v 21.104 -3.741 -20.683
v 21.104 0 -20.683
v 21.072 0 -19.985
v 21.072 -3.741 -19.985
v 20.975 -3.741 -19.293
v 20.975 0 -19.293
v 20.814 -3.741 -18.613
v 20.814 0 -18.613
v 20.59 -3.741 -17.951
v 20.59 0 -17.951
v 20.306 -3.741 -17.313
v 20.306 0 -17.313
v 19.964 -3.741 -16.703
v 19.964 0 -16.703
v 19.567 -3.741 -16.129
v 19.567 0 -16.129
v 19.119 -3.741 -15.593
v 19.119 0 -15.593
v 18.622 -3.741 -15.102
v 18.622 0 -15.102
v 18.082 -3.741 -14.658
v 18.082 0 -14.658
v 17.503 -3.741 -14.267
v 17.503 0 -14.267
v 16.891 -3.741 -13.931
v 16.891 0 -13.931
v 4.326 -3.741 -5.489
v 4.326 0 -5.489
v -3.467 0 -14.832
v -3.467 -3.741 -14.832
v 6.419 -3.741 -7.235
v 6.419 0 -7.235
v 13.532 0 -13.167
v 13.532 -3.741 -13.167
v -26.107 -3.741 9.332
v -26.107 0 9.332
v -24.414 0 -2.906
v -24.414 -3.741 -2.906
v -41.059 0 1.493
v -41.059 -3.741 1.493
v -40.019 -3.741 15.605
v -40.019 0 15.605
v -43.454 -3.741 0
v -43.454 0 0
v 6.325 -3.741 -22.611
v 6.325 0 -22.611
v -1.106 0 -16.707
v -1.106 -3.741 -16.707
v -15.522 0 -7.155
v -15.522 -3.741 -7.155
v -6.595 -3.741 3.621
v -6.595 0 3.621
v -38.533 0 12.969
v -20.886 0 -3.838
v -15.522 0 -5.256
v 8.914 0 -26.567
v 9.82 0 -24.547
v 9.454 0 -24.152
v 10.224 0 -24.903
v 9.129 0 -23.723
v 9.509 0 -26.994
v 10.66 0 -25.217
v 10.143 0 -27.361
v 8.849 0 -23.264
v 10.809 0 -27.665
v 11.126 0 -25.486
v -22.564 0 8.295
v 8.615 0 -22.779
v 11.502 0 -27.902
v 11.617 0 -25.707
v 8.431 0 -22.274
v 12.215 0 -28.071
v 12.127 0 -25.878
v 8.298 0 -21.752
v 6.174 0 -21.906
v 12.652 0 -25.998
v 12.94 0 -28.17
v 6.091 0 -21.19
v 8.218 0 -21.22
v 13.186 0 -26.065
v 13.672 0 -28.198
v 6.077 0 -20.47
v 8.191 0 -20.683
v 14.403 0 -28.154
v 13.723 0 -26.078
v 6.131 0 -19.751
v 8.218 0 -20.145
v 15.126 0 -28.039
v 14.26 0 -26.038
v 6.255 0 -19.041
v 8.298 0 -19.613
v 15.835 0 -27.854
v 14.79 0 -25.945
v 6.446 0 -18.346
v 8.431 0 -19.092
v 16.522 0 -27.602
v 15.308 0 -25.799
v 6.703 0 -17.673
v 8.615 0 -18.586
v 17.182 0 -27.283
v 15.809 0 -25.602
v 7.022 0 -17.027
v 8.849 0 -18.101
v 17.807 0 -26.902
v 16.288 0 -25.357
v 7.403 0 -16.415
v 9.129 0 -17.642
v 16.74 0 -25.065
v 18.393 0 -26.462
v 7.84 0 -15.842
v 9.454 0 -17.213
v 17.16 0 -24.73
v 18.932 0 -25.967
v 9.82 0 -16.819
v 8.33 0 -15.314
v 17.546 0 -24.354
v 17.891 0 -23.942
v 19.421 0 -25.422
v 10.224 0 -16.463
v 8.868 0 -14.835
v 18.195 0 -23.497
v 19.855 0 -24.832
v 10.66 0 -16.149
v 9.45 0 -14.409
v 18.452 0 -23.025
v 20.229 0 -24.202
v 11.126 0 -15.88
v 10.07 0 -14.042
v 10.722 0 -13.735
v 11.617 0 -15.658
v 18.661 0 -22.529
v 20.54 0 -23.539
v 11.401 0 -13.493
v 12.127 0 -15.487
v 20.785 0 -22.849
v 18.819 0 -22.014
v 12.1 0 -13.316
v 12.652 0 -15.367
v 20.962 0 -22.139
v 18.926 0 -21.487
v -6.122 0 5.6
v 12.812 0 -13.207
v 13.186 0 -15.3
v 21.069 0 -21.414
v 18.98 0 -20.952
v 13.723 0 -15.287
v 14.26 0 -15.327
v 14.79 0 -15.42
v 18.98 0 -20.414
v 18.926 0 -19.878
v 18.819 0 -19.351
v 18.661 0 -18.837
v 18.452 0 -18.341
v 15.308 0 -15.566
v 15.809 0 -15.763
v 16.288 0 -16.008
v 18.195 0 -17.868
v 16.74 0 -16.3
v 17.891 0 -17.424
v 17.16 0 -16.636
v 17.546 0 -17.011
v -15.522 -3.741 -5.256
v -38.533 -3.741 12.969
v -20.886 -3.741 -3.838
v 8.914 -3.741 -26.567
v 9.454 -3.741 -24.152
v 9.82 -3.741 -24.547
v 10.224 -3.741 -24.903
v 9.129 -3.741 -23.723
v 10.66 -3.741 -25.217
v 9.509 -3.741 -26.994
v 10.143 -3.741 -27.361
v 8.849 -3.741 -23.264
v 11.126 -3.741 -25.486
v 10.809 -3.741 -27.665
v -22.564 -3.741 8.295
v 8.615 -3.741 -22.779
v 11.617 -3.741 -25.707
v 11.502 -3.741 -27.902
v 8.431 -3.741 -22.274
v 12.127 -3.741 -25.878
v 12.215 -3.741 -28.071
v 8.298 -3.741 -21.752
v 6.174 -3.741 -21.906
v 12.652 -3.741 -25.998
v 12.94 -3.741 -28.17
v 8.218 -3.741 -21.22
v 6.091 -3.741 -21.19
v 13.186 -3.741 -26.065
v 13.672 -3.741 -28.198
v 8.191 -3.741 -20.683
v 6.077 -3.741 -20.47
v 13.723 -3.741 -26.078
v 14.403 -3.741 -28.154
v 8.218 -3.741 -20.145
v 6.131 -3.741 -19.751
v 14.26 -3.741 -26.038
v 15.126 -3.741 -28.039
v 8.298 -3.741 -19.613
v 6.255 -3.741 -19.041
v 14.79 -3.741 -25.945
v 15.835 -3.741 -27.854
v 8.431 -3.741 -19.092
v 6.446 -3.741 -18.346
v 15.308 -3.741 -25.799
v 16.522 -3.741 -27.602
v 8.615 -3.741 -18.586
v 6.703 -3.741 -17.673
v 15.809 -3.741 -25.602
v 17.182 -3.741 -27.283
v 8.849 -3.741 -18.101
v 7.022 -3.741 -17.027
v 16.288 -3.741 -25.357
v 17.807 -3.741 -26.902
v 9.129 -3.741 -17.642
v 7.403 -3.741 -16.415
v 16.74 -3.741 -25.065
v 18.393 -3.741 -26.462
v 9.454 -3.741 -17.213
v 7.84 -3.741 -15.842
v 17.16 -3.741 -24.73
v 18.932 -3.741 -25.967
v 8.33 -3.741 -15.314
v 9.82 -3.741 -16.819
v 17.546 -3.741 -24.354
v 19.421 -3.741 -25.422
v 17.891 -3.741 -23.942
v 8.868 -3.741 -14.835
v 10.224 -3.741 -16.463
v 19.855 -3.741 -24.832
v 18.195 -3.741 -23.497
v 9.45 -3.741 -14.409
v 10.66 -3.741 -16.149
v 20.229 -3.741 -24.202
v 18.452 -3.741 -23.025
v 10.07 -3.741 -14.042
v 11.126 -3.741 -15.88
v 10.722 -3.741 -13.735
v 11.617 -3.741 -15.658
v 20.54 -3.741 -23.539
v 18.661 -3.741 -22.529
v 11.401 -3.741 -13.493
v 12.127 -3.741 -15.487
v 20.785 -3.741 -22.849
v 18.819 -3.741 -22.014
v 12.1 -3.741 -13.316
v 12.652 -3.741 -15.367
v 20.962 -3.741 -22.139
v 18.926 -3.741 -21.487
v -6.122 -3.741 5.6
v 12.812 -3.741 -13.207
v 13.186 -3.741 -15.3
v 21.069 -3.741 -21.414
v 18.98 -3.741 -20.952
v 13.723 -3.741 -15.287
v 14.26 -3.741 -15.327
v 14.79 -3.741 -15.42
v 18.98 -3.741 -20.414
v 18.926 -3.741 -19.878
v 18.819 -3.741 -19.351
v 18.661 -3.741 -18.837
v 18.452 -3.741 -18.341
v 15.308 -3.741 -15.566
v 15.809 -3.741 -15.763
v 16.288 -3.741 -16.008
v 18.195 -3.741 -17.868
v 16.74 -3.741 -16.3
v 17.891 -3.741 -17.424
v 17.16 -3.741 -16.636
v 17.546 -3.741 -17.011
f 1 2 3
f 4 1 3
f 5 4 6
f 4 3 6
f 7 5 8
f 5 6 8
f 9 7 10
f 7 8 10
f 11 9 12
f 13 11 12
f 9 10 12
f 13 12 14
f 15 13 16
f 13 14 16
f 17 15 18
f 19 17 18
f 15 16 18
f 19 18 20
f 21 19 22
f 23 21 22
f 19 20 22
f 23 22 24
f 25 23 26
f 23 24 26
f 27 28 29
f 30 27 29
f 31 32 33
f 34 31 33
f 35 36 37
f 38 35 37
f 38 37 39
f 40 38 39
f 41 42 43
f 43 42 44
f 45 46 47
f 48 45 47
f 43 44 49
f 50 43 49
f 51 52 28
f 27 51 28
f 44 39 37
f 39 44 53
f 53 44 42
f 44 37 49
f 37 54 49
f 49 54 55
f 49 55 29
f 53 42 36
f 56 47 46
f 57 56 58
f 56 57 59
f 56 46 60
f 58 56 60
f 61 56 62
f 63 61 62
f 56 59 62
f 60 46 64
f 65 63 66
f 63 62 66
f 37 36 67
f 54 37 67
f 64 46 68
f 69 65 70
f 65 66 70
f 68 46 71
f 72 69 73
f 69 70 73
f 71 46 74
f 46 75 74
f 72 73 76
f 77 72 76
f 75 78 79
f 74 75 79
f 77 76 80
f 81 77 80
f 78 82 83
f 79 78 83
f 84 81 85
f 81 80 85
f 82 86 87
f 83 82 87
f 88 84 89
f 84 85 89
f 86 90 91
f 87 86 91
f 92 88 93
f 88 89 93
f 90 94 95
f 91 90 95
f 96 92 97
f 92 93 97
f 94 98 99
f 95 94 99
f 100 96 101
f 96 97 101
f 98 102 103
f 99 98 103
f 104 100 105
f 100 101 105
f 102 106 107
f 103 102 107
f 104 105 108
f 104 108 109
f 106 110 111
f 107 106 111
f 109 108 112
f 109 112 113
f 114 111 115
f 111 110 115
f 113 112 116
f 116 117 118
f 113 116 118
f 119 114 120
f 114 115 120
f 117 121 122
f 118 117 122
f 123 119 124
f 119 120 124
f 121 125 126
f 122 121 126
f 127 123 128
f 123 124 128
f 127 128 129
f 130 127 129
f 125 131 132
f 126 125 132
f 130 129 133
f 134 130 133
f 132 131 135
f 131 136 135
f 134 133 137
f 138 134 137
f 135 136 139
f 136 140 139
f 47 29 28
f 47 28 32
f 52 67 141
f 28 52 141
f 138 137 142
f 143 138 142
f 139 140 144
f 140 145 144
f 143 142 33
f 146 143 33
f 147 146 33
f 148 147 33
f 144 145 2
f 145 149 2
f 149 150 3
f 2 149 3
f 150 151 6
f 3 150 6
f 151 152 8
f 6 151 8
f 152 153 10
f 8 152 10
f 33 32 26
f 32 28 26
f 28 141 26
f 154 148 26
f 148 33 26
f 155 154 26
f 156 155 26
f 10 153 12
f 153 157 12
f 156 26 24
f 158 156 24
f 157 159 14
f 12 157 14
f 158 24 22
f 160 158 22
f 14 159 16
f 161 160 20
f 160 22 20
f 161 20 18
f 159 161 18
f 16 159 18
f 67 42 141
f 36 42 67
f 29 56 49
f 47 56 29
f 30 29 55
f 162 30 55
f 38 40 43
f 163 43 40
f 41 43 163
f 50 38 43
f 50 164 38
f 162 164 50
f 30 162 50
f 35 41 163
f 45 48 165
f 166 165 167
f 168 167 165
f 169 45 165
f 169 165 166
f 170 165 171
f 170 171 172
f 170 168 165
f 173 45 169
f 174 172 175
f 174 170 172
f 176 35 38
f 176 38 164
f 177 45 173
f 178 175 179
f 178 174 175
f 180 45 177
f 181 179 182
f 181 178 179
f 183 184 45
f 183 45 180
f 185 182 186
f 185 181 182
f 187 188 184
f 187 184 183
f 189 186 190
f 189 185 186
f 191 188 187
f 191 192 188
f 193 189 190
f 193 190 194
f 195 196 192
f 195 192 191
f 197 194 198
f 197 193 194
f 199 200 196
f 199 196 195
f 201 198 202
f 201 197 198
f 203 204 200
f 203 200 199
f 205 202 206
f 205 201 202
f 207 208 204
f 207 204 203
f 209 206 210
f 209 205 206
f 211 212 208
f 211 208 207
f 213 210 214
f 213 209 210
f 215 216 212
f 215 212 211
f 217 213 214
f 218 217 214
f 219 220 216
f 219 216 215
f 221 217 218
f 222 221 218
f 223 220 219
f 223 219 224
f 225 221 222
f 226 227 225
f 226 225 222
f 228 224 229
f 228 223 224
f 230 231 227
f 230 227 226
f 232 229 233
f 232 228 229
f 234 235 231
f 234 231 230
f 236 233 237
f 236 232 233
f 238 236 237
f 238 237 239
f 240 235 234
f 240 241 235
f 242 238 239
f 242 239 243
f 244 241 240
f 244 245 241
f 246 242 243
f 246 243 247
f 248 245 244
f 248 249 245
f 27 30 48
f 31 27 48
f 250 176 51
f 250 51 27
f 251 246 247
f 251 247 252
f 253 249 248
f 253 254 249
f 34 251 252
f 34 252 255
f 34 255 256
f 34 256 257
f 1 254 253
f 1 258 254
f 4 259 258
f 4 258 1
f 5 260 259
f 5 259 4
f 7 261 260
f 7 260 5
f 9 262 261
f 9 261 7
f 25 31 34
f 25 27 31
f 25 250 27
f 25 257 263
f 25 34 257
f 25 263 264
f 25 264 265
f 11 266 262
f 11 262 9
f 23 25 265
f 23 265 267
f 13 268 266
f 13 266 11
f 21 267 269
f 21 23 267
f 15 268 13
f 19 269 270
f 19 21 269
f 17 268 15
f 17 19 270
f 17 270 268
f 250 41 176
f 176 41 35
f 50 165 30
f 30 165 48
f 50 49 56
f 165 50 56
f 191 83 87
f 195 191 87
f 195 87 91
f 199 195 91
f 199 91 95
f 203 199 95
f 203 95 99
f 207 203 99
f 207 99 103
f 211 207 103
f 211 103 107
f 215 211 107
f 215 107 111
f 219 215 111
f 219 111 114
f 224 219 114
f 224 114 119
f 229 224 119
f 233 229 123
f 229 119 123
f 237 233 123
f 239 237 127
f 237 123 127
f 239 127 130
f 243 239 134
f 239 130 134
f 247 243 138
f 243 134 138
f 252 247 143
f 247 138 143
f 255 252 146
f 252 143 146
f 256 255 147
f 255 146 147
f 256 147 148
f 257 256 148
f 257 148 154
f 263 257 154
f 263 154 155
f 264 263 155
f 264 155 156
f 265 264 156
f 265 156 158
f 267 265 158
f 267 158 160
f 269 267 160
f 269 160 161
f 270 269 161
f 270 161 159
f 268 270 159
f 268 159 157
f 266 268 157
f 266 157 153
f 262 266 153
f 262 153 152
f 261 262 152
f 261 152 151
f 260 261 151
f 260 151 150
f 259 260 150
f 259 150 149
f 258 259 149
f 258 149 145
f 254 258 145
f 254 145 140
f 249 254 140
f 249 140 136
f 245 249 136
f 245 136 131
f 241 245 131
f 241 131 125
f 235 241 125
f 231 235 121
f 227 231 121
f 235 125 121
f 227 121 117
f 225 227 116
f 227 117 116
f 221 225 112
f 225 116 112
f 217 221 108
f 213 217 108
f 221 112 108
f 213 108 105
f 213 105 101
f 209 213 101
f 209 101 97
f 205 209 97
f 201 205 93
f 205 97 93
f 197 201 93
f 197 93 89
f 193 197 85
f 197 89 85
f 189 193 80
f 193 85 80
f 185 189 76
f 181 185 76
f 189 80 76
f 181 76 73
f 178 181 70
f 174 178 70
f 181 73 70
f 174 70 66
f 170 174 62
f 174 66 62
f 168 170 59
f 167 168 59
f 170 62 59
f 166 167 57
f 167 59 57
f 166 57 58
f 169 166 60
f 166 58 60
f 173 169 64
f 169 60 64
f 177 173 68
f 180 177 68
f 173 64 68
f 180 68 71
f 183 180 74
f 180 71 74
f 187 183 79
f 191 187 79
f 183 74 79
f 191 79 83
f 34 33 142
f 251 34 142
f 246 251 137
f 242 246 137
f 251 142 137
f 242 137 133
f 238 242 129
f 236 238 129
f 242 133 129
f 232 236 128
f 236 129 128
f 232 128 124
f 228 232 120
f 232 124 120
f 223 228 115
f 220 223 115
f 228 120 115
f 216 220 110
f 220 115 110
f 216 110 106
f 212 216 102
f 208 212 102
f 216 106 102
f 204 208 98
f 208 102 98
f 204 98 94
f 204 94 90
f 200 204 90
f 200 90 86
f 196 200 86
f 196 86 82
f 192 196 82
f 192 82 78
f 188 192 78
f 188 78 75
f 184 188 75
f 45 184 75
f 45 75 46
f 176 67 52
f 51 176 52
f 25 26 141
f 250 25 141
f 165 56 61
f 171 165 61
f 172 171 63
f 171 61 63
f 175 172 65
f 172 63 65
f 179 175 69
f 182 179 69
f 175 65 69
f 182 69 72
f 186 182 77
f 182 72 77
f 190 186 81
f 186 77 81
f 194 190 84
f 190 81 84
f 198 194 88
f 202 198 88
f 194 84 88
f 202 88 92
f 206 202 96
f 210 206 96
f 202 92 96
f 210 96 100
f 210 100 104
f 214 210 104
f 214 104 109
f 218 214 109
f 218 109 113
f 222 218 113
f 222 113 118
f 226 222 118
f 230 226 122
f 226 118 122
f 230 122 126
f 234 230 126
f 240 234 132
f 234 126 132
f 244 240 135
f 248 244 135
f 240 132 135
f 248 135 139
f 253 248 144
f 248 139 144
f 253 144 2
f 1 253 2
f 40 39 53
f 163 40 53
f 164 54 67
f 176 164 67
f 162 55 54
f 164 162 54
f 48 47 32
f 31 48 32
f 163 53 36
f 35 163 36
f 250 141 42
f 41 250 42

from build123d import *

# Parameters (mm, degrees)
F0_R     = 4.1529
F1_DEPTH = 3.74112
F2_R     = 5.3975
F3_DEPTH = 25.4


with BuildPart() as f1:
    # F0 (on Front) → F1 (new body)
    with BuildSketch(Plane.XZ):
        Polygon((-1.106079, -16.707432), (6.419018, -7.234566), (4.326342, -5.488987), (-3.466987, -14.831964), align=None)
        Polygon((-20.885671, -3.838109), (-22.564381, 8.295304), (-26.106817, 9.332149), (-24.413652, -2.905742), align=None)
        with BuildLine():
            ThreePointArc((13.531608, -13.167445), (15.255443, -13.354337), (16.890565, -13.931319))
            Line((16.890565, -13.931319), (-6.122345, 5.599705))
            Line((-6.122345, 5.599705), (-40.019221, 15.604509))
            Line((-40.019221, 15.604509), (-43.453703, 0))
            Line((-43.453703, 0), (-15.522079, -7.155403))
            Line((-15.522079, -7.155403), (8.91424, -26.567232))
            ThreePointArc((8.91424, -26.567232), (7.30033, -24.797842), (6.325001, -22.610565))
            Line((6.325001, -22.610565), (-1.106079, -16.707432))
            Line((-1.106079, -16.707432), (-3.466987, -14.831964))
            Line((-3.466987, -14.831964), (-15.522079, -5.255588))
            Line((-15.522079, -5.255588), (-20.885671, -3.838109))
            Line((-20.885671, -3.838109), (-24.413652, -2.905742))
            Line((-24.413652, -2.905742), (-41.059079, 1.493276))
            Line((-41.059079, 1.493276), (-38.533263, 12.969277))
            Line((-38.533263, 12.969277), (-26.106817, 9.332149))
            Line((-26.106817, 9.332149), (-22.564381, 8.295304))
            Line((-22.564381, 8.295304), (-6.595499, 3.621332))
            Line((-6.595499, 3.621332), (4.326342, -5.488987))
            Line((4.326342, -5.488987), (6.419018, -7.234566))
            Line((6.419018, -7.234566), (13.531608, -13.167445))
        make_face()
        with BuildLine():
            ThreePointArc((8.91424, -26.567232), (16.856094, -27.450659), (21.104277, -20.682615))
            ThreePointArc((21.104277, -20.682615), (19.964406, -16.703439), (16.890565, -13.931319))
            ThreePointArc((16.890565, -13.931319), (15.255443, -13.354337), (13.531608, -13.167445))
            ThreePointArc((13.531608, -13.167445), (7.614526, -16.123223), (6.325001, -22.610565))
            ThreePointArc((6.325001, -22.610565), (7.30033, -24.797842), (8.91424, -26.567232))
        make_face()
        with Locations((13.588889, -20.682615)):
            Circle(F0_R, mode=Mode.SUBTRACT)
        with Locations((13.588889, -20.682615)):
            Circle(F0_R)
    extrude(amount=F1_DEPTH)

    # F2 (on face) → F3 (cut)
    with BuildSketch(Plane(origin=(0, 0, 0), x_dir=(-1, 0, 0), z_dir=(0, 1, 0))):
        with Locations((-13.588889, -20.682615)):
            Circle(F2_R)
    extrude(amount=-F3_DEPTH, mode=Mode.SUBTRACT)


solid = f1.part
